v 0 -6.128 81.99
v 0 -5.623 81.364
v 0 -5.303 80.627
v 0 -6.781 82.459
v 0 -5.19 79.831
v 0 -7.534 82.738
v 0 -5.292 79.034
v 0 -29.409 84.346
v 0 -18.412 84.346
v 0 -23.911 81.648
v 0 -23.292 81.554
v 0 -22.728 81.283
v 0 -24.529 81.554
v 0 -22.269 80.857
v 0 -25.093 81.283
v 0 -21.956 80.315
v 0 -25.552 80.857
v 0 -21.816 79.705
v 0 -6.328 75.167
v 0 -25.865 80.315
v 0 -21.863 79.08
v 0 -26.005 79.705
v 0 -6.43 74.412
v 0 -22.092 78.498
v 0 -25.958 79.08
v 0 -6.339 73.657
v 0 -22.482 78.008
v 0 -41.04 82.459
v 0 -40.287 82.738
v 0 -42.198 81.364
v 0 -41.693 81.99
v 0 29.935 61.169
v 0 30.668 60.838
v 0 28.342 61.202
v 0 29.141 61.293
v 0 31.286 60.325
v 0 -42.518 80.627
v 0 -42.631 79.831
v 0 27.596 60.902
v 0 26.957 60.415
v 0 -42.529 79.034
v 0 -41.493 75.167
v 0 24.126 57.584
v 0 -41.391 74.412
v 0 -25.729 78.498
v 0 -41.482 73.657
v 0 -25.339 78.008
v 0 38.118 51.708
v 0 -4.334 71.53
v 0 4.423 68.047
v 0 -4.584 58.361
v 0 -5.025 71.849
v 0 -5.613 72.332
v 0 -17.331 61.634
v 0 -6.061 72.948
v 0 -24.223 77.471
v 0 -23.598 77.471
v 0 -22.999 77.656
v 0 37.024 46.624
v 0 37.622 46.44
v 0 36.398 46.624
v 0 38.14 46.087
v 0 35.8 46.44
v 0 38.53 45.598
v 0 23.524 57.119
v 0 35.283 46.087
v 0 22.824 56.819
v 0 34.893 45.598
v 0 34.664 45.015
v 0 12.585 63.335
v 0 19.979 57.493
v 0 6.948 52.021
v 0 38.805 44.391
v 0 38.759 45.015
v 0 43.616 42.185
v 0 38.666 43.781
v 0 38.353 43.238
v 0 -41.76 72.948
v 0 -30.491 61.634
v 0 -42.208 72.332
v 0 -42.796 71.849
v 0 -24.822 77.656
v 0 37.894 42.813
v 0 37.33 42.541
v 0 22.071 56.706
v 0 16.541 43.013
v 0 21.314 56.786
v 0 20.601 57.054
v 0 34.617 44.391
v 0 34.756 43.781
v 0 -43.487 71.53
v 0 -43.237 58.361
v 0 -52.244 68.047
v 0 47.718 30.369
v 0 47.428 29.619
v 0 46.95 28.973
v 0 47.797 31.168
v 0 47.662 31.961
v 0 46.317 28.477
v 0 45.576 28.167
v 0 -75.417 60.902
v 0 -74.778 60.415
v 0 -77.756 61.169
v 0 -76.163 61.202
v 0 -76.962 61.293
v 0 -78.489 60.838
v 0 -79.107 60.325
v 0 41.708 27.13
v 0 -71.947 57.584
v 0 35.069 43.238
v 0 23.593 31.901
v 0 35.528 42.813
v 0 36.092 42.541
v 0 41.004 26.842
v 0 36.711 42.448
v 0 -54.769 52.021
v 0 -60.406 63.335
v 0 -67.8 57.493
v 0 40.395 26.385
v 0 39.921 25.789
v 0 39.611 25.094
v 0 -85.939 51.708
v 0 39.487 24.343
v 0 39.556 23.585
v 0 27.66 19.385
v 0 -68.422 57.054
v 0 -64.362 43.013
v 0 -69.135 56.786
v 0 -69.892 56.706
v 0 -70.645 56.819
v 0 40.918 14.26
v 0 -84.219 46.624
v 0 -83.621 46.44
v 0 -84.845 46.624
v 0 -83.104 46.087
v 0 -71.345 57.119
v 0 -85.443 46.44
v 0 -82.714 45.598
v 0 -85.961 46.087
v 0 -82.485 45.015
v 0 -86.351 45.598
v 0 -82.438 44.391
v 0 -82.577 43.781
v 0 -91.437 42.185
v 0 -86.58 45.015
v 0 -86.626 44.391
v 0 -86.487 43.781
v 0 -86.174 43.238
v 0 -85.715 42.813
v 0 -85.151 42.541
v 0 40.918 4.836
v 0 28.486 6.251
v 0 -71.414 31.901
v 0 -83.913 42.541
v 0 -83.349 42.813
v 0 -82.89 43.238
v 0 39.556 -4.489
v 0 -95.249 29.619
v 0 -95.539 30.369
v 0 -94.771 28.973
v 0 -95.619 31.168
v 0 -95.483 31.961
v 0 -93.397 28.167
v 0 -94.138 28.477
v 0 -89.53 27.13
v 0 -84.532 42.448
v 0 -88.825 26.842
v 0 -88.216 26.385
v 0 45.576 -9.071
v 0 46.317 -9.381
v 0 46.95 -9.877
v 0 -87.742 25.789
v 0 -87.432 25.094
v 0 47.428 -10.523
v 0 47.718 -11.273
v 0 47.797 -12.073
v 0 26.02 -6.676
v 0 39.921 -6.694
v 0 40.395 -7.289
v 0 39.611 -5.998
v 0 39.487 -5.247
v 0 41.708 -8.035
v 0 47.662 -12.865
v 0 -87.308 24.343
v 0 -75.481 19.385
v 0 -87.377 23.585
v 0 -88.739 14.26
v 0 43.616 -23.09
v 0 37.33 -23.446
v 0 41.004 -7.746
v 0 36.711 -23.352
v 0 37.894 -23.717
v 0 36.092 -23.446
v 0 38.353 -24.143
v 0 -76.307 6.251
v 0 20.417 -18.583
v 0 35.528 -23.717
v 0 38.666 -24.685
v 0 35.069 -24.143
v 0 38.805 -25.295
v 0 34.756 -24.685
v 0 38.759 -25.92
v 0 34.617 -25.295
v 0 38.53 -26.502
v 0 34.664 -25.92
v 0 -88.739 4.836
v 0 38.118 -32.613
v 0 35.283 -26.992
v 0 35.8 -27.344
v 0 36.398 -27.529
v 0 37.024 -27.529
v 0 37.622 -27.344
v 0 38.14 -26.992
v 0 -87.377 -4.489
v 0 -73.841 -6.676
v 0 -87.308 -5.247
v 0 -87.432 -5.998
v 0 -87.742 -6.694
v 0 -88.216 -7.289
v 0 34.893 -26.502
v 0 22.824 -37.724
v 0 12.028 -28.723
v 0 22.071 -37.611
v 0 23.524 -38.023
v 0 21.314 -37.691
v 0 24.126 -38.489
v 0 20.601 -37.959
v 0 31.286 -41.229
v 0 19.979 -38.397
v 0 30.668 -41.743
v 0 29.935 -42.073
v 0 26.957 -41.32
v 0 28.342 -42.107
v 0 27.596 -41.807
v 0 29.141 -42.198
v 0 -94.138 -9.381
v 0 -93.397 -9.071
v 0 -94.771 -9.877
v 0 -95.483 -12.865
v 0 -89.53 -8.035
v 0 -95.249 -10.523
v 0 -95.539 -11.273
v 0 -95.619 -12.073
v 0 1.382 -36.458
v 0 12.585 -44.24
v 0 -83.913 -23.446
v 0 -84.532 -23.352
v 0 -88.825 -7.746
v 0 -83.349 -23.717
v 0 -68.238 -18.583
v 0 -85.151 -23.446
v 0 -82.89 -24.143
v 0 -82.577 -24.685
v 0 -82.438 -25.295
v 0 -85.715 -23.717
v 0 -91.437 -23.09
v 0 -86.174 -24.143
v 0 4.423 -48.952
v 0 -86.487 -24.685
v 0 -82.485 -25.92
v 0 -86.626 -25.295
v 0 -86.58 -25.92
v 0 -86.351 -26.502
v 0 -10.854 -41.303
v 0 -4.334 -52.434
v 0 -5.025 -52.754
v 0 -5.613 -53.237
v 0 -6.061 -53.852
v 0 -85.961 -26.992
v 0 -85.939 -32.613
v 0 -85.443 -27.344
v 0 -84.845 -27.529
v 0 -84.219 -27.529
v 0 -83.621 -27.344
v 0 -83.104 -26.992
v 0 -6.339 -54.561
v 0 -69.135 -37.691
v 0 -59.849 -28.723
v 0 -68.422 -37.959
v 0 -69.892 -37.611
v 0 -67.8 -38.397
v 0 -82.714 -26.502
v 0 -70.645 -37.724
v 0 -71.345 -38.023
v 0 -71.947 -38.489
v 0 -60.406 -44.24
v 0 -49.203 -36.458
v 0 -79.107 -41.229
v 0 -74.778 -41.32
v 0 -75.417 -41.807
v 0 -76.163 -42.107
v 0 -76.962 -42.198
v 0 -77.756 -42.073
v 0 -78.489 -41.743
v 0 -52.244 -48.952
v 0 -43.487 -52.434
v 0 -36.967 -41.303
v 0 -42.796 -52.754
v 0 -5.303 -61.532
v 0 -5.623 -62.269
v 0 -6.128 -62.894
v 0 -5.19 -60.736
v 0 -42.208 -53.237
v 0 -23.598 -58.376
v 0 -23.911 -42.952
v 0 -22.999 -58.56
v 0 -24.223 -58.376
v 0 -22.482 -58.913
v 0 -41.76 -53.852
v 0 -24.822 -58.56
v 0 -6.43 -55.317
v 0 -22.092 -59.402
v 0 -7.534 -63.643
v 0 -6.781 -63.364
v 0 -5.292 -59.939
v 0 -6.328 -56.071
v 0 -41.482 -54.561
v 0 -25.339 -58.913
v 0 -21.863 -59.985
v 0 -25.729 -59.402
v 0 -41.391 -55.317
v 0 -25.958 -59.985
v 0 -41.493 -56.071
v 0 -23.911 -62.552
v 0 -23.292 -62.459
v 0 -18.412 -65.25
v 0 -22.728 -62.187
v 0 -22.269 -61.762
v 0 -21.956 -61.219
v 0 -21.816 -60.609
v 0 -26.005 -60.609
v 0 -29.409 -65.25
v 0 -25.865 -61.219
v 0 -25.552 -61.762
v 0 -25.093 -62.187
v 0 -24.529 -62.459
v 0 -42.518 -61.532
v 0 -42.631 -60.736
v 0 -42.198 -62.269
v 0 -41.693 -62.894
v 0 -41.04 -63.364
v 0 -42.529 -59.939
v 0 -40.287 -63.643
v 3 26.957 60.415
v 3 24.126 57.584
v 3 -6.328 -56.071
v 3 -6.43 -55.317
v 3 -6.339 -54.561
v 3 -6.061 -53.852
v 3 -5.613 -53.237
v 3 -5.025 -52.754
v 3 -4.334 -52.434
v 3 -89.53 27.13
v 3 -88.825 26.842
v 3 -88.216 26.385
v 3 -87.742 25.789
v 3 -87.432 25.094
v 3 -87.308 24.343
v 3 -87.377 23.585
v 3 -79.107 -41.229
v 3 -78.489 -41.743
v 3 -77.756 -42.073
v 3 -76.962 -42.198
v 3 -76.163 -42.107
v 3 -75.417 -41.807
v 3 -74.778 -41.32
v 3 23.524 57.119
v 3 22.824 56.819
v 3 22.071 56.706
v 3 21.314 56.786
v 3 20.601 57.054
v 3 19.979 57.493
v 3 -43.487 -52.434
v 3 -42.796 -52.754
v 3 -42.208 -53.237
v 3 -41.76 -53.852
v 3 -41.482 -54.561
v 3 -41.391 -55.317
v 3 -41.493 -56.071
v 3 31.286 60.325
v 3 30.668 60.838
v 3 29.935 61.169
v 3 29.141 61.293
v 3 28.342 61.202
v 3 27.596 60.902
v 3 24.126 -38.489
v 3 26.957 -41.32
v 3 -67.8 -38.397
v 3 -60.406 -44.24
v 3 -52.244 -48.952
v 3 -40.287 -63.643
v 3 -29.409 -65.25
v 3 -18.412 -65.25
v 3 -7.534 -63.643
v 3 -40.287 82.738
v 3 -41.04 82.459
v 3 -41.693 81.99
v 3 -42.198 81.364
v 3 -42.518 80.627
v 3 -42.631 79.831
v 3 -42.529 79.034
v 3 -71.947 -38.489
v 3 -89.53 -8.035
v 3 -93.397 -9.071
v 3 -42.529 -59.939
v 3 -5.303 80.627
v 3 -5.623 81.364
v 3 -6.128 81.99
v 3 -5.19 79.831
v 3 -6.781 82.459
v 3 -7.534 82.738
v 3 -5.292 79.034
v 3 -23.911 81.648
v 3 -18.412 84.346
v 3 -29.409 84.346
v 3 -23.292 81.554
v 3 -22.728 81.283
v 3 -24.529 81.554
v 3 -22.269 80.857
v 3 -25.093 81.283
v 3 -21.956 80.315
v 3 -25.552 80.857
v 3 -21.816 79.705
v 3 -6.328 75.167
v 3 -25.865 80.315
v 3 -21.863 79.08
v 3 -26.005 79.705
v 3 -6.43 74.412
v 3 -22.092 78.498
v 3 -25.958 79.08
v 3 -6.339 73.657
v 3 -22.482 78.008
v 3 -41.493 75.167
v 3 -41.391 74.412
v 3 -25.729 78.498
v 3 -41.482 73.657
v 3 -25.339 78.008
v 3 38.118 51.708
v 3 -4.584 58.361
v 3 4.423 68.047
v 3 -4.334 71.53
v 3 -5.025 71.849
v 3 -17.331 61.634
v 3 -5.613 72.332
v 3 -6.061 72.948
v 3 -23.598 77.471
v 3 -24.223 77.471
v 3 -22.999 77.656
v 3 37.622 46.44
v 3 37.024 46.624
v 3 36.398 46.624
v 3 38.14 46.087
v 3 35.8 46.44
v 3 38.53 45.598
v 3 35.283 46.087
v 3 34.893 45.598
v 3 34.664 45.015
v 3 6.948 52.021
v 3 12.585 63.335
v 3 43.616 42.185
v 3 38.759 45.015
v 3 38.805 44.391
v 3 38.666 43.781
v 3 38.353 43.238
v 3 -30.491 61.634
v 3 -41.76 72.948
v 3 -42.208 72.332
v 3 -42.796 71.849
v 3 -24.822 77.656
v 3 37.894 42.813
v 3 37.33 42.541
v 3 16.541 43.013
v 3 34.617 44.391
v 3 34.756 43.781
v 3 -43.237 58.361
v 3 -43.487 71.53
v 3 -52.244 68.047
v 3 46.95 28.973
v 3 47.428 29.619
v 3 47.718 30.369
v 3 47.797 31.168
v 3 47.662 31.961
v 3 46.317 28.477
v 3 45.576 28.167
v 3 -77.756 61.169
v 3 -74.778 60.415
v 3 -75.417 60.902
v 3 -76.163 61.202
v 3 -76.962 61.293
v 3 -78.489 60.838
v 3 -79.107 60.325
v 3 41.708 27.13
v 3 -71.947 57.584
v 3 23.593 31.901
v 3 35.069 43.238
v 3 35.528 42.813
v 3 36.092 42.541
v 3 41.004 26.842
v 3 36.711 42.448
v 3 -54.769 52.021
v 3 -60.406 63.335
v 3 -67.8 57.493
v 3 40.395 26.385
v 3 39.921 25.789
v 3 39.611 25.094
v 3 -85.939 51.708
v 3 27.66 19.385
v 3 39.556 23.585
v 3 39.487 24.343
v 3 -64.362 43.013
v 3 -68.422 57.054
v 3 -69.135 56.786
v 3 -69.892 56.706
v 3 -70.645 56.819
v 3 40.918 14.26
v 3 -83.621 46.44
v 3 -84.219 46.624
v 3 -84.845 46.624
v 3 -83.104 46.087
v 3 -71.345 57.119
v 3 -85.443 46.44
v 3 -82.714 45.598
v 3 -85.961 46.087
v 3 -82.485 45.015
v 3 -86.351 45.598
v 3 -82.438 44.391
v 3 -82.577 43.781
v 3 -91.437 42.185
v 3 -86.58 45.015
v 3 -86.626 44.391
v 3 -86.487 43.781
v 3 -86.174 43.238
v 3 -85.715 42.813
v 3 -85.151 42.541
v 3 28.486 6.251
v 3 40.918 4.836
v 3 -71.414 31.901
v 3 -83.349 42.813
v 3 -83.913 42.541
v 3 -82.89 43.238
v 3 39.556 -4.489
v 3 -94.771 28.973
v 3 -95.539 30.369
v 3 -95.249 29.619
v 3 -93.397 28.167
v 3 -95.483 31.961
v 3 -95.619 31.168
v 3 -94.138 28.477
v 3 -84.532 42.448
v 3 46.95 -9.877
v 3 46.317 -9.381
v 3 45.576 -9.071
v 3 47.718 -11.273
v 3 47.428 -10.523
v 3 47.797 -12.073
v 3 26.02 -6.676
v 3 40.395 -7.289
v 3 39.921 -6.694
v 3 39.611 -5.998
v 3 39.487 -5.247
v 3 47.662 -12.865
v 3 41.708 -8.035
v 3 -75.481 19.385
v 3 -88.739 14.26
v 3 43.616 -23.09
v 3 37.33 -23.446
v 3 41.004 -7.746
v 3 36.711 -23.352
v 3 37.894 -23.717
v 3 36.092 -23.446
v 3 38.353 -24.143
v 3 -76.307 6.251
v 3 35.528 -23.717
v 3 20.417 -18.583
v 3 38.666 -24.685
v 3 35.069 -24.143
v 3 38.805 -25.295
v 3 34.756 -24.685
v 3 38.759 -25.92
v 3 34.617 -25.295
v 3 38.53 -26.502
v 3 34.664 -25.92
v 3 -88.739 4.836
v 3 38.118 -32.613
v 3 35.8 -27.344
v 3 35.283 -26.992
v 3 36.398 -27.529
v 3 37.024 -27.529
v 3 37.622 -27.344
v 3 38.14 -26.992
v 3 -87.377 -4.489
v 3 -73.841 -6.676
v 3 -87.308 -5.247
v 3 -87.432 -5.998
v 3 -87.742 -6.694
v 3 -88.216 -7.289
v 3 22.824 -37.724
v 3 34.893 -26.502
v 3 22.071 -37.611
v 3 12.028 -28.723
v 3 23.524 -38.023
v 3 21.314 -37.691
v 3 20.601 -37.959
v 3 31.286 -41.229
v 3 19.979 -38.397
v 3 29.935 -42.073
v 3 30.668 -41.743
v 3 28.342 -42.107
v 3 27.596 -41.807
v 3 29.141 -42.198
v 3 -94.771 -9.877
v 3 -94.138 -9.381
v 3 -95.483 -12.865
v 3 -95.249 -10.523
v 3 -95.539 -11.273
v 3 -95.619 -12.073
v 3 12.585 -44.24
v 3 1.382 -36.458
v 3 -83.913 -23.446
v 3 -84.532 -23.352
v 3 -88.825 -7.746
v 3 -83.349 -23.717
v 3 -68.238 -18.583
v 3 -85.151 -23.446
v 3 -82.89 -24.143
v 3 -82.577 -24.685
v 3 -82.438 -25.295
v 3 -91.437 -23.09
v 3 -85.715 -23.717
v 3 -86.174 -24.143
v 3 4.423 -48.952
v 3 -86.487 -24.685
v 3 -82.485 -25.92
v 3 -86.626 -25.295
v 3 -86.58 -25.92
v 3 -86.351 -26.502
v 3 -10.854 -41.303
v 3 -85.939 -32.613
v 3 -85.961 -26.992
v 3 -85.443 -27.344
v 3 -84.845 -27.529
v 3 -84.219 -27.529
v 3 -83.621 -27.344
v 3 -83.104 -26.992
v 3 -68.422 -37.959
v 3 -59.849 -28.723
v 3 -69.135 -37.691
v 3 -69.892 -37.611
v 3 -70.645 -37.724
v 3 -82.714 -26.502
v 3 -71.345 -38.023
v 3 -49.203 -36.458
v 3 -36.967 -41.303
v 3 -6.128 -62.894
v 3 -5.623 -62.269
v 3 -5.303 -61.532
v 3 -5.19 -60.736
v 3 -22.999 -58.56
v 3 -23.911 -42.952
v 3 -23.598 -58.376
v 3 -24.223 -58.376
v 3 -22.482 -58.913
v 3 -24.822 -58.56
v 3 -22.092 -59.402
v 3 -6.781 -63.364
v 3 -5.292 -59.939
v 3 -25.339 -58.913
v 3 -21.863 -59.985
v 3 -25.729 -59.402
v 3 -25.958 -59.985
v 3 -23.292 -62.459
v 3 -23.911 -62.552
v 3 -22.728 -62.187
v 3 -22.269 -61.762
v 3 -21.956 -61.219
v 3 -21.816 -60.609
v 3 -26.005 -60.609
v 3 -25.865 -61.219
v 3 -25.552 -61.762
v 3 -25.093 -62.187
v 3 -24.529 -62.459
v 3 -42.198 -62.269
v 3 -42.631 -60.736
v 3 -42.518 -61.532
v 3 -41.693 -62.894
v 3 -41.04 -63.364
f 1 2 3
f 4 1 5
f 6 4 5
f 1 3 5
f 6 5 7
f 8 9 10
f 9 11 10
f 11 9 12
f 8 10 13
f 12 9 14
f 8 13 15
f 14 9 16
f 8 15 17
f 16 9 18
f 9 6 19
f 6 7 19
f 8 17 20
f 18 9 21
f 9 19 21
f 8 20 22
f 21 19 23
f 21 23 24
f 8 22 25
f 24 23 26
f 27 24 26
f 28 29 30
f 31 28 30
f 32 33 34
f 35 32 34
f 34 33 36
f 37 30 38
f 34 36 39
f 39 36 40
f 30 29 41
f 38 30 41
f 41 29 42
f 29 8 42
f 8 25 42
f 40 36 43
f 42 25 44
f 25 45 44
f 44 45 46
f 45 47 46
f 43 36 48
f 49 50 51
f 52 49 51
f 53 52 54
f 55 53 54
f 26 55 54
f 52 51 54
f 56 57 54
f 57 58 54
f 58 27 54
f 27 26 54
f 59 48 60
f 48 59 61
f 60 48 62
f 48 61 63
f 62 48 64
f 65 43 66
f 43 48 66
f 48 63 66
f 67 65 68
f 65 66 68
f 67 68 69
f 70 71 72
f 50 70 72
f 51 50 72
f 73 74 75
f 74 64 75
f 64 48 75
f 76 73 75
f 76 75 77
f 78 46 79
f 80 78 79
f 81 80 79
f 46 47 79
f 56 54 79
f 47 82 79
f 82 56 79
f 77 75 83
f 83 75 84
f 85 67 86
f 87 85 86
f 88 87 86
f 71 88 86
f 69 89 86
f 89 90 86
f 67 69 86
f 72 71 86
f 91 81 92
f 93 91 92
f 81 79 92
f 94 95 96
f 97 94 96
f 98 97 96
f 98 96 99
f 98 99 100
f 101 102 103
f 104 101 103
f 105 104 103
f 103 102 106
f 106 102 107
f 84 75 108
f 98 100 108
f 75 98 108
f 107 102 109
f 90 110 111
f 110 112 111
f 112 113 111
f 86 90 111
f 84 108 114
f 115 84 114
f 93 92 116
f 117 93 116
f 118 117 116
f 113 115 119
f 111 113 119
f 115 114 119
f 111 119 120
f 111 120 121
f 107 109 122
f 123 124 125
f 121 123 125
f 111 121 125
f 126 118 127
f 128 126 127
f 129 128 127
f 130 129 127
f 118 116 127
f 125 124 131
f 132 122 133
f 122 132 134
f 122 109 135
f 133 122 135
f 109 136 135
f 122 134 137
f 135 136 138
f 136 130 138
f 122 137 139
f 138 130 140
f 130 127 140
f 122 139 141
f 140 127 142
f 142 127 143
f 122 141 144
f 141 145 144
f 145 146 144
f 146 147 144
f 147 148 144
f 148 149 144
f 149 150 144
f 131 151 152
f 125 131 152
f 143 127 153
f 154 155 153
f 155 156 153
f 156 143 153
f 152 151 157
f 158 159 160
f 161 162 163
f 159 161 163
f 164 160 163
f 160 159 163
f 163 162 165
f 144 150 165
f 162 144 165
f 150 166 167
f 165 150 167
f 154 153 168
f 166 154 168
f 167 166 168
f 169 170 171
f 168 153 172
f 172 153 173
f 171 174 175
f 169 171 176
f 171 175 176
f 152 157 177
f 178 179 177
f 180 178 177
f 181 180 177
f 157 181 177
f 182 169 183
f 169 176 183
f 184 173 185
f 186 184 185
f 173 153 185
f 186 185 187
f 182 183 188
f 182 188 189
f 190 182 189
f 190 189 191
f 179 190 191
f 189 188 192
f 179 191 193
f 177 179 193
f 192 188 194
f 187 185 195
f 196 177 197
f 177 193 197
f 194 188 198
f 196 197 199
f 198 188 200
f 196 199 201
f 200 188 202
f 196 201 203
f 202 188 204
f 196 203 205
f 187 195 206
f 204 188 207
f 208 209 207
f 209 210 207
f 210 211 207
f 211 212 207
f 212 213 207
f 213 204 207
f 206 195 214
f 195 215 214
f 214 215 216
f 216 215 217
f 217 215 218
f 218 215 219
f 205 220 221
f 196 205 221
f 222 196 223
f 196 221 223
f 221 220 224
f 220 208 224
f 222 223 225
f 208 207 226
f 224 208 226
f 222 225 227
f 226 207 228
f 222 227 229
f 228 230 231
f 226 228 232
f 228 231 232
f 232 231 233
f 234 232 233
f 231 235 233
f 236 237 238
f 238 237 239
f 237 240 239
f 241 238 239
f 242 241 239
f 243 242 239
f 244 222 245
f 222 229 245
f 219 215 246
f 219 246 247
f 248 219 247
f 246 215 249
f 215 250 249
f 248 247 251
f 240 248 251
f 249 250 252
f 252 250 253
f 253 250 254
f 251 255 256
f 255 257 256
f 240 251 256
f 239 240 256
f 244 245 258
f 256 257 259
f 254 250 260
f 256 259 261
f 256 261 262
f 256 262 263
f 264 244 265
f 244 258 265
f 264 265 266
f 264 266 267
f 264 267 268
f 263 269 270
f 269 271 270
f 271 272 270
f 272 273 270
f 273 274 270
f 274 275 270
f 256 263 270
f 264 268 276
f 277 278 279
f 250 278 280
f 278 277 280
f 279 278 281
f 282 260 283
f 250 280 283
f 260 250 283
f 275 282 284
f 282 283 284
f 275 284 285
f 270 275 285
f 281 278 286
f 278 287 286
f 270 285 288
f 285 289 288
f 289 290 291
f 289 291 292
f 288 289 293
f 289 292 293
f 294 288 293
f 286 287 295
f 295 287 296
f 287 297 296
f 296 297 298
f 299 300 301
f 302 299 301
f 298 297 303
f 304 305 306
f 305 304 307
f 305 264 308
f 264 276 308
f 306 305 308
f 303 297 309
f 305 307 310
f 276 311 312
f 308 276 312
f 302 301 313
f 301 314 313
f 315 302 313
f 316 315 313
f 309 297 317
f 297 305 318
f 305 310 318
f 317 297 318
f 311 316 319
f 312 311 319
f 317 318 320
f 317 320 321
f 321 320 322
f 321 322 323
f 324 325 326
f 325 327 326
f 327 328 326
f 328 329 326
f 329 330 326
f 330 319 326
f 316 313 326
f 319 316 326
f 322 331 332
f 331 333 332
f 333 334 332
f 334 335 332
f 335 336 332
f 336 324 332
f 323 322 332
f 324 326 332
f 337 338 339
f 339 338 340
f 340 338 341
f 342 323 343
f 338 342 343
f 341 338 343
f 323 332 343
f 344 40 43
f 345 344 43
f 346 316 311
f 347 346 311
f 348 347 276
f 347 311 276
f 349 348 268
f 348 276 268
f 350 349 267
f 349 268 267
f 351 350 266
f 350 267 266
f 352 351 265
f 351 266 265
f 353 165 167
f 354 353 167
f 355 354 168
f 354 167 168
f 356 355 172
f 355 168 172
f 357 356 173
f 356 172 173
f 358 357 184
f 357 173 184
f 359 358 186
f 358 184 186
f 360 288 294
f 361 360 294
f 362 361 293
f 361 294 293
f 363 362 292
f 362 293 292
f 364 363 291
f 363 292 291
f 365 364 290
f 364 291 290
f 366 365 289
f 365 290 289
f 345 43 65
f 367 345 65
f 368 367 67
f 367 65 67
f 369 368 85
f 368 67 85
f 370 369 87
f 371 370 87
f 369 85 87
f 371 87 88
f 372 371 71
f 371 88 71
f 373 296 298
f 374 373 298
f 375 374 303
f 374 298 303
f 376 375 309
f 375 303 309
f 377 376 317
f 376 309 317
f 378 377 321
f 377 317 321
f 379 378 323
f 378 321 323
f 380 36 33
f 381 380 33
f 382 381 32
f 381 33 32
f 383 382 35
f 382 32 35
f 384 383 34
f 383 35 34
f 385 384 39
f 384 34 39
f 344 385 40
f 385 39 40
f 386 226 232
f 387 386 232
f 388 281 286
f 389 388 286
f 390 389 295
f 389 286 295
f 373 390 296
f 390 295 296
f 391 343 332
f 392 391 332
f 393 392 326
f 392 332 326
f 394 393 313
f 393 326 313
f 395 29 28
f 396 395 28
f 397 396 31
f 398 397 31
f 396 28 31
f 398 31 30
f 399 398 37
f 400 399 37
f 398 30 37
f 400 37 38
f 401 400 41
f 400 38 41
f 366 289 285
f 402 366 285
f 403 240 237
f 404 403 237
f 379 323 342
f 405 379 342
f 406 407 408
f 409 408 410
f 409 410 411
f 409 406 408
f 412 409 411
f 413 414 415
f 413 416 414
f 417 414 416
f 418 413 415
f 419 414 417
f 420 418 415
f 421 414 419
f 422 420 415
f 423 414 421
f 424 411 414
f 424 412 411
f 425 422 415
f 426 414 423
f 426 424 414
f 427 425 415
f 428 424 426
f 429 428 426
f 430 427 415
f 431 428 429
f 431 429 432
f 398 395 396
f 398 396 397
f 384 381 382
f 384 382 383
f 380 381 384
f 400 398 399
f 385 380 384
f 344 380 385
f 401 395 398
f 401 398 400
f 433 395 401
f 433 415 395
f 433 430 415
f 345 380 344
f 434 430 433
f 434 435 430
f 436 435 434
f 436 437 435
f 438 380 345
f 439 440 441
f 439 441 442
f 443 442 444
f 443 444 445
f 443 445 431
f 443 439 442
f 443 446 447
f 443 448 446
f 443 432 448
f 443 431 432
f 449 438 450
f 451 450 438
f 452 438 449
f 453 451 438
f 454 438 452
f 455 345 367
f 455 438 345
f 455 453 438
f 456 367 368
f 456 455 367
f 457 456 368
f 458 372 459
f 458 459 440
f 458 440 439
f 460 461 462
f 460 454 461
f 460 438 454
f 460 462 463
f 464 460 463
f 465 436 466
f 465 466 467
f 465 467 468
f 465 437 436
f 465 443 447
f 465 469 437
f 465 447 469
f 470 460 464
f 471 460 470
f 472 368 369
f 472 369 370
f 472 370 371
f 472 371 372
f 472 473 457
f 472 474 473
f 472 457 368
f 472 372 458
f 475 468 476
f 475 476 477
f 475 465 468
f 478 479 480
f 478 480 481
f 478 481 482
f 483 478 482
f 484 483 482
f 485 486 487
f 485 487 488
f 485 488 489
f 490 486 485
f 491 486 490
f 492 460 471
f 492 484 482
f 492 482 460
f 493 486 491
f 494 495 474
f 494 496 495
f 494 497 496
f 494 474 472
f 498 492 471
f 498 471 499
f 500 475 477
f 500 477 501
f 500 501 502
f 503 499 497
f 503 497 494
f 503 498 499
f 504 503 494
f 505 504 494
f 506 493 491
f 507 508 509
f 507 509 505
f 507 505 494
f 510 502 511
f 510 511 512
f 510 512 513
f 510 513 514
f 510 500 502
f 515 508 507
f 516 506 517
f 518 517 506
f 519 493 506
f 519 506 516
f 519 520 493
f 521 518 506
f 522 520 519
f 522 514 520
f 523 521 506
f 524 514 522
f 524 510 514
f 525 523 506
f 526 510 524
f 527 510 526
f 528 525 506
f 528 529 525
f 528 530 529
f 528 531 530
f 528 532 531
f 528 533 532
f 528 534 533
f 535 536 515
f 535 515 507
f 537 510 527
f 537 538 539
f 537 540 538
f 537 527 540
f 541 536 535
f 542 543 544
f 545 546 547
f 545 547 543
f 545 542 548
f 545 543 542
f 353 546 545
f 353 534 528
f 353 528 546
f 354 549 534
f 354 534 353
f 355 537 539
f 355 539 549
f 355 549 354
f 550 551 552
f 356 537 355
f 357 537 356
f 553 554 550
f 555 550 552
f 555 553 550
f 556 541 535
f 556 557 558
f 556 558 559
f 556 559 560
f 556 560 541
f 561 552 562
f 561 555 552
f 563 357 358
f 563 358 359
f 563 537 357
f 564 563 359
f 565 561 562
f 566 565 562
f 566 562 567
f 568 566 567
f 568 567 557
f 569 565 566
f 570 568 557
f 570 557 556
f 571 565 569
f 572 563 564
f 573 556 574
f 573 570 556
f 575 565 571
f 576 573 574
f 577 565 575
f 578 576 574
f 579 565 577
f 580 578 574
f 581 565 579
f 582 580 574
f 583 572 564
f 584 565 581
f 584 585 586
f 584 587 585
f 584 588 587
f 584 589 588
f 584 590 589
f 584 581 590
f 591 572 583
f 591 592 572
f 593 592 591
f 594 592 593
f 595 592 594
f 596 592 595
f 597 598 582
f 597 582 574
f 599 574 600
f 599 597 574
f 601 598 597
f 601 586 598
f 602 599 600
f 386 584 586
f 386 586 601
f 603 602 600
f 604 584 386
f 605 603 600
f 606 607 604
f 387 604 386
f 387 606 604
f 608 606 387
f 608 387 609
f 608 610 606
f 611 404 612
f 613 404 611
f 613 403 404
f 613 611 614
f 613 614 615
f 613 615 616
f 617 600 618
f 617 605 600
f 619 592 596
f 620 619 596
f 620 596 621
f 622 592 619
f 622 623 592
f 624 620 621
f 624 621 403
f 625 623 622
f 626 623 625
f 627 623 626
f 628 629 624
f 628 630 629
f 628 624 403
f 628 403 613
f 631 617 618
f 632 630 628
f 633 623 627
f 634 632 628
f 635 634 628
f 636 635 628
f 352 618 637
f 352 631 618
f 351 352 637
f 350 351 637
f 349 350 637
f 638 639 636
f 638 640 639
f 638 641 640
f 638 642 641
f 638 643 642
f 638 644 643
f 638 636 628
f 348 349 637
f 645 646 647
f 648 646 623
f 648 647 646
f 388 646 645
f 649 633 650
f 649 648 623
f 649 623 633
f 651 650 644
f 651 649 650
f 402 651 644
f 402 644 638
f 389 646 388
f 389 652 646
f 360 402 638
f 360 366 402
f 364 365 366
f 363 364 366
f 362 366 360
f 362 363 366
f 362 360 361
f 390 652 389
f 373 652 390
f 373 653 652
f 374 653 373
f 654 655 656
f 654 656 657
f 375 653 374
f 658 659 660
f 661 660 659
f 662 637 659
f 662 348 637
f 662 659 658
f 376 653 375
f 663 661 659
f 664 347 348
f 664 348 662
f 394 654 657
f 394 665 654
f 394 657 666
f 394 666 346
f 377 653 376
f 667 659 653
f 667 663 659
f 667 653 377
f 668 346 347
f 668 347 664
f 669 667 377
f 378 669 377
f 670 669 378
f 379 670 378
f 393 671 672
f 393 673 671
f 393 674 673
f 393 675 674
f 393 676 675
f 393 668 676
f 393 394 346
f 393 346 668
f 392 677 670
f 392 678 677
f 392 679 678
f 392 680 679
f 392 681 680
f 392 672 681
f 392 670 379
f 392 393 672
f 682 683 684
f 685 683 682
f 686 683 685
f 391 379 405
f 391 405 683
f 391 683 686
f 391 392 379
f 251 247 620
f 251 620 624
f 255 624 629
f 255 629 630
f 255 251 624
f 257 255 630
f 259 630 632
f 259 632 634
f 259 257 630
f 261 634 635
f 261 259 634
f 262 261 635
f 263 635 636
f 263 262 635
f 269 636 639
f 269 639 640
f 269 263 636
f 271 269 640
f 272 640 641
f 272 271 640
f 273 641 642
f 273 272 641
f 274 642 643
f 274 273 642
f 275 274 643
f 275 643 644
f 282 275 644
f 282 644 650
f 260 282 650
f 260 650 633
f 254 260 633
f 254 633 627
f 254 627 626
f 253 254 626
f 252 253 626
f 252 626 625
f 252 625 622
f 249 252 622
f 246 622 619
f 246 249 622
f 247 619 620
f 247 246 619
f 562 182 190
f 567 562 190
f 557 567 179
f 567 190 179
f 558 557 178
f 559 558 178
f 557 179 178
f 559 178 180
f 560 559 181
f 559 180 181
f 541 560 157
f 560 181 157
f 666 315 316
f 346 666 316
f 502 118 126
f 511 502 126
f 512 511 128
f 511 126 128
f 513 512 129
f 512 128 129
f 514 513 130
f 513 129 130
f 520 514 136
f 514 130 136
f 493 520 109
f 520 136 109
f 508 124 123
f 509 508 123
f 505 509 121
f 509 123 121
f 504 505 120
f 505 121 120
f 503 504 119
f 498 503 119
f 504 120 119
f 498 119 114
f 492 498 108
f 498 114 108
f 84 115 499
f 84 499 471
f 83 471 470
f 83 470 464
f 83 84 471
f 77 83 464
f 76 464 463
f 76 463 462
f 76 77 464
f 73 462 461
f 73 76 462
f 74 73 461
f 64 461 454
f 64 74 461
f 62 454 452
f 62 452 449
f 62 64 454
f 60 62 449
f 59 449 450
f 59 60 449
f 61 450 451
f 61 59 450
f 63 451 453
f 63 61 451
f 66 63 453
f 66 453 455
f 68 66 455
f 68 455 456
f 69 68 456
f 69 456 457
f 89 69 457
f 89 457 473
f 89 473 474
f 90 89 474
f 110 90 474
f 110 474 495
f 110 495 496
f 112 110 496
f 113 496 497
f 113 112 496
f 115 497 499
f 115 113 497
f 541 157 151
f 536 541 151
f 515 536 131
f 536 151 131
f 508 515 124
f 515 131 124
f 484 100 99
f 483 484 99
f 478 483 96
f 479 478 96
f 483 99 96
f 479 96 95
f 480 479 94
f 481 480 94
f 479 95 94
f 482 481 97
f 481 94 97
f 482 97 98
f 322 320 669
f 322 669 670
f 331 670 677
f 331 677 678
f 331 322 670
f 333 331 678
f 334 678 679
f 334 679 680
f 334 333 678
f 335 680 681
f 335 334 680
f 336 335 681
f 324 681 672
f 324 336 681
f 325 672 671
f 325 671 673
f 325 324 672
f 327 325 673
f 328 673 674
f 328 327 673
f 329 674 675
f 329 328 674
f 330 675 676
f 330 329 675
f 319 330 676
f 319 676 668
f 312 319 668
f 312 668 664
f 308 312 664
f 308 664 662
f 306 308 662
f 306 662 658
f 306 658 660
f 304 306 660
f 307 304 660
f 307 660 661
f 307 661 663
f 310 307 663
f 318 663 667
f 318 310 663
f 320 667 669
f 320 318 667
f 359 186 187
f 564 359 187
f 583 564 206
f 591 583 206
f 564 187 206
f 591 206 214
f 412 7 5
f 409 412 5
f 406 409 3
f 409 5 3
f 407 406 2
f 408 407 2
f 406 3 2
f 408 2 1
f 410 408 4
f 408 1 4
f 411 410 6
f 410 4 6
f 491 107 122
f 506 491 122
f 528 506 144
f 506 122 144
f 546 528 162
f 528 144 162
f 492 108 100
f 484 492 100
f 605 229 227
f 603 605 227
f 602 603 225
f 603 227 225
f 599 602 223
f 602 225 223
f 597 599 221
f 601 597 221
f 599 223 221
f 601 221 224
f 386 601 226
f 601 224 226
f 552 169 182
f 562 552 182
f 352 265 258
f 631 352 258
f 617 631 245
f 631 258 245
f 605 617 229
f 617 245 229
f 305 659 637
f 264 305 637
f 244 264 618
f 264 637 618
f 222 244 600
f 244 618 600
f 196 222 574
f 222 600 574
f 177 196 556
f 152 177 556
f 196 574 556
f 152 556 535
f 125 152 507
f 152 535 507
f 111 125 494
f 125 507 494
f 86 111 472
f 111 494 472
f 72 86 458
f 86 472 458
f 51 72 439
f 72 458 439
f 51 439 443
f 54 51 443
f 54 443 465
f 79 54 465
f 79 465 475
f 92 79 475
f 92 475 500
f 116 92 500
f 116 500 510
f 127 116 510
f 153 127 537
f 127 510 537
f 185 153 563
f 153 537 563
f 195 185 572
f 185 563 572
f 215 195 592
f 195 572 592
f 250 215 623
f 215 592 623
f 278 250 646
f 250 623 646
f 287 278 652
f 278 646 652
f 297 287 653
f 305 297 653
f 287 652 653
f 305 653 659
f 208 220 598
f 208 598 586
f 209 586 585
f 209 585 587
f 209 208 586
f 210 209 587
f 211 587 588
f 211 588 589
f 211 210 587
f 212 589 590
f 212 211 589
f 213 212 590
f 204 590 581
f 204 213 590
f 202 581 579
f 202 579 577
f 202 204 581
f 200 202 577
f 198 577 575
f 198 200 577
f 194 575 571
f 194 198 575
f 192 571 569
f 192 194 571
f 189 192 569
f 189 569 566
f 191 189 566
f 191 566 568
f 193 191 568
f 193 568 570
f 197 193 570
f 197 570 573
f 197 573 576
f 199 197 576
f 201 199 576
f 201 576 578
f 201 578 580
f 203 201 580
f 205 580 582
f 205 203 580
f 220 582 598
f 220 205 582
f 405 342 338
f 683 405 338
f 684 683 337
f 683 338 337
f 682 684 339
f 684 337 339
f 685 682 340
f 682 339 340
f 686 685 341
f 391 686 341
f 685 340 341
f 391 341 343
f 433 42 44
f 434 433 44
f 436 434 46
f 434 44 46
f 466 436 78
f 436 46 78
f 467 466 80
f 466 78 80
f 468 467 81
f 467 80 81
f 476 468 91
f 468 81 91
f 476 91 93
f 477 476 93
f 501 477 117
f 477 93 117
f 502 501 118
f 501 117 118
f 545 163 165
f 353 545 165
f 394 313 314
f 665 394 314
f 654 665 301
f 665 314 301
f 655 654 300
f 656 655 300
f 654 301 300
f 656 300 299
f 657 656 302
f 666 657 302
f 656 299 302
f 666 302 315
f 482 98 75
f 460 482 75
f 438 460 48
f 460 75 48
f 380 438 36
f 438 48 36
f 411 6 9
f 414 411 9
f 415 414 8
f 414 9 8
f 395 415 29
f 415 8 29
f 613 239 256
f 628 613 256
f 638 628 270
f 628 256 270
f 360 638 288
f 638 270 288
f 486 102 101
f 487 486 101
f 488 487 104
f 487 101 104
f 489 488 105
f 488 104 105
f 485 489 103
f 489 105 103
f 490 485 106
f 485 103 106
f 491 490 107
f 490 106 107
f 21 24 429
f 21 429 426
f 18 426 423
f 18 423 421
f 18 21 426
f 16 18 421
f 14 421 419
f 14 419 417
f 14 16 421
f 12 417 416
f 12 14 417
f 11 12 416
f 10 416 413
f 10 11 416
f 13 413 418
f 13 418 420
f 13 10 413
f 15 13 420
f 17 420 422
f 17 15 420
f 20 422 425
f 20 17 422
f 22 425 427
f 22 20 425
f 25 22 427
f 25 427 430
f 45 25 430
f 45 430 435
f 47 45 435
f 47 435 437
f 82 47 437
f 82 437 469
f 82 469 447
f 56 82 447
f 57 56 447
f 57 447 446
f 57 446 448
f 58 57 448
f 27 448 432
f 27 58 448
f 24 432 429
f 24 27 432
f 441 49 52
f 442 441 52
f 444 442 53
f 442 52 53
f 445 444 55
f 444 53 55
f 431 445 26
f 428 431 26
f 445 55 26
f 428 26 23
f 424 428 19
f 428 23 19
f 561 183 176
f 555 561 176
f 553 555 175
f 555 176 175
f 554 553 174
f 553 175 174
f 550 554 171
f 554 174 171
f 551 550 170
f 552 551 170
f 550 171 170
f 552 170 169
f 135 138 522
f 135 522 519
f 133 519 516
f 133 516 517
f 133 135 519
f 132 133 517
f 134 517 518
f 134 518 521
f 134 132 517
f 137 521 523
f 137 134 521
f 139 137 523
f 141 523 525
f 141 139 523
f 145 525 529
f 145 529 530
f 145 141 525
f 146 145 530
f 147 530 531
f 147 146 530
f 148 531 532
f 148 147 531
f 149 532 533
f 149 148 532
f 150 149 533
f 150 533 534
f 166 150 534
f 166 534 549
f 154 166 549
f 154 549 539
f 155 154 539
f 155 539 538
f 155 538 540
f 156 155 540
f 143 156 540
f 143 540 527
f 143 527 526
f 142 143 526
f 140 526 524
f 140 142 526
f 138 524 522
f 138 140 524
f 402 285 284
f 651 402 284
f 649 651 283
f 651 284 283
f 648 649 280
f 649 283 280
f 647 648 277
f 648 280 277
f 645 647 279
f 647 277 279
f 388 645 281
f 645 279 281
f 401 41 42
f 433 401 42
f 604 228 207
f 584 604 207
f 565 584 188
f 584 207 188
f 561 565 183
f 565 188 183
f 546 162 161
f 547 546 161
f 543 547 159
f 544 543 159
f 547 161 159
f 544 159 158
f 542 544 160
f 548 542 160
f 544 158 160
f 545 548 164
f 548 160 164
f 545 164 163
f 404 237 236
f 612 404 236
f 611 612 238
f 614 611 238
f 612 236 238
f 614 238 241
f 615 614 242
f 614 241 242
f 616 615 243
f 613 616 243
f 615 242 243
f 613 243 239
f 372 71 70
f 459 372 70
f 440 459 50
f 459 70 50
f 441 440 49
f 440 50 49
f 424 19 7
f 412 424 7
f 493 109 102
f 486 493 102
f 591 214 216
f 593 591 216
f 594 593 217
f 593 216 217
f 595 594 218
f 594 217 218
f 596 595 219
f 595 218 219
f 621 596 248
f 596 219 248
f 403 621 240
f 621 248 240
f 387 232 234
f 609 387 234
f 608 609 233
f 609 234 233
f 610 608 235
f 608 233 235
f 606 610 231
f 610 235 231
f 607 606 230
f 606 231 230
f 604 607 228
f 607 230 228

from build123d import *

# Parameters (mm, degrees)
SKETCH_2_R               = 2.807146676
EXTRUDE_2_DEPTH          = 3
SKETCH_3_R               = 52.5
CUT_EXTRUDE_1_DEPTH      = 3
EXTRUDE_START            = -3
SKETCH_4_R               = 2.807146676
SKETCH_4_R_2             = 2.1
EXTRUDE_3_DEPTH          = 3
PATTERN_CIRCULAR_1_COUNT = 6


with BuildPart() as part:
    # 草图2 → 凸台-拉伸2 (new body)
    with BuildSketch(Plane(origin=(0, 0, 0), x_dir=(0, 0, -1), z_dir=(1, 0, 0))):
        with BuildLine():
            Line((-60.415227383, 26.95696902), (-57.584197007, 24.125938644))
            ThreePointArc((-57.584197007, 24.125938644), (-56.706247683, 22.070810886), (-57.492674784, 19.978951059))
            ThreePointArc((-57.492674784, 19.978951059), (-65.839403755, 8.589494146), (-71.529598291, -4.333713637))
            ThreePointArc((-71.529598291, -4.333713637), (-72.947988492, -6.060709399), (-75.166756001, -6.32794686))
            Line((-75.166756001, -6.32794686), (-79.034015413, -5.291717824))
            ThreePointArc((-79.034015413, -5.291717824), (-81.364285194, -5.623240003), (-82.738085883, -7.534453196))
            ThreePointArc((-82.738085883, -7.534453196), (-84.547752509, -23.910505854), (-82.738085883, -40.286558511))
            ThreePointArc((-82.738085883, -40.286558511), (-81.364285194, -42.197771704), (-79.034015413, -42.529293884))
            Line((-79.034015413, -42.529293884), (-75.166756001, -41.493064847))
            ThreePointArc((-75.166756001, -41.493064847), (-72.947988492, -41.760302308), (-71.529598291, -43.48729807))
            ThreePointArc((-71.529598291, -43.48729807), (-65.839403755, -56.410505854), (-57.492674784, -67.799962766))
            ThreePointArc((-57.492674784, -67.799962766), (-56.706247683, -69.891822593), (-57.584197007, -71.946950351))
            Line((-57.584197007, -71.946950351), (-60.415227383, -74.777980727))
            ThreePointArc((-60.415227383, -74.777980727), (-61.293255644, -76.961814644), (-60.324996811, -79.107167538))
            ThreePointArc((-60.324996811, -79.107167538), (-47.047752509, -88.862411137), (-31.960841581, -95.483220195))
            ThreePointArc((-31.960841581, -95.483220195), (-29.618782059, -95.249080495), (-28.16654054, -93.396768757))
            Line((-28.16654054, -93.396768757), (-27.130311503, -89.529509345))
            ThreePointArc((-27.130311503, -89.529509345), (-25.789493318, -87.741619048), (-23.584676016, -87.376754982))
            ThreePointArc((-23.584676016, -87.376754982), (-9.547752509, -88.910505854), (4.489170997, -87.376754982))
            ThreePointArc((4.489170997, -87.376754982), (6.693988299, -87.741619048), (8.034806484, -89.529509345))
            Line((8.034806484, -89.529509345), (9.071035521, -93.396768757))
            ThreePointArc((9.071035521, -93.396768757), (10.52327704, -95.249080495), (12.865336562, -95.483220195))
            ThreePointArc((12.865336562, -95.483220195), (27.952247491, -88.862411137), (41.229491792, -79.107167538))
            ThreePointArc((41.229491792, -79.107167538), (42.197750625, -76.961814644), (41.319722364, -74.777980727))
            Line((41.319722364, -74.777980727), (38.488691988, -71.946950351))
            ThreePointArc((38.488691988, -71.946950351), (37.610742664, -69.891822593), (38.397169765, -67.799962766))
            ThreePointArc((38.397169765, -67.799962766), (46.743898737, -56.410505854), (52.434093272, -43.48729807))
            ThreePointArc((52.434093272, -43.48729807), (53.852483473, -41.760302308), (56.071250982, -41.493064847))
            Line((56.071250982, -41.493064847), (59.938510394, -42.529293884))
            ThreePointArc((59.938510394, -42.529293884), (62.268780175, -42.197771704), (63.642580864, -40.286558511))
            ThreePointArc((63.642580864, -40.286558511), (65.452247491, -23.910505854), (63.642580864, -7.534453196))
            ThreePointArc((63.642580864, -7.534453196), (62.268780175, -5.623240003), (59.938510394, -5.291717824))
            Line((59.938510394, -5.291717824), (56.071250982, -6.32794686))
            ThreePointArc((56.071250982, -6.32794686), (53.852483473, -6.060709399), (52.434093272, -4.333713637))
            ThreePointArc((52.434093272, -4.333713637), (46.743898737, 8.589494146), (38.397169765, 19.978951059))
            ThreePointArc((38.397169765, 19.978951059), (37.610742664, 22.070810886), (38.488691988, 24.125938644))
            Line((38.488691988, 24.125938644), (41.319722364, 26.95696902))
            ThreePointArc((41.319722364, 26.95696902), (42.197750625, 29.140802937), (41.229491792, 31.286155831))
            ThreePointArc((41.229491792, 31.286155831), (27.952247491, 41.04139943), (12.865336562, 47.662208488))
            ThreePointArc((12.865336562, 47.662208488), (10.52327704, 47.428068788), (9.071035521, 45.57575705))
            Line((9.071035521, 45.57575705), (8.034806484, 41.708497638))
            ThreePointArc((8.034806484, 41.708497638), (6.693988299, 39.92060734), (4.489170997, 39.555743275))
            ThreePointArc((4.489170997, 39.555743275), (-9.547752509, 41.089494146), (-23.584676016, 39.555743275))
            ThreePointArc((-23.584676016, 39.555743275), (-25.789493318, 39.92060734), (-27.130311503, 41.708497638))
            Line((-27.130311503, 41.708497638), (-28.16654054, 45.57575705))
            ThreePointArc((-28.16654054, 45.57575705), (-29.618782059, 47.428068788), (-31.960841581, 47.662208488))
            ThreePointArc((-31.960841581, 47.662208488), (-47.047752509, 41.04139943), (-60.324996811, 31.286155831))
            ThreePointArc((-60.324996811, 31.286155831), (-61.293255644, 29.140802937), (-60.415227383, 26.95696902))
        make_face()
        with Locations((-44.547752509, 36.711272411)):
            Circle(SKETCH_2_R, mode=Mode.SUBTRACT)
        with Locations((-79.547752509, -23.910505854)):
            Circle(SKETCH_2_R, mode=Mode.SUBTRACT)
        with Locations((-44.547752509, -84.532284119)):
            Circle(SKETCH_2_R, mode=Mode.SUBTRACT)
        with Locations((25.452247491, -84.532284119)):
            Circle(SKETCH_2_R, mode=Mode.SUBTRACT)
        with Locations((60.452247491, -23.910505854)):
            Circle(SKETCH_2_R, mode=Mode.SUBTRACT)
        with Locations((25.452247491, 36.711272411)):
            Circle(SKETCH_2_R, mode=Mode.SUBTRACT)
    extrude(amount=EXTRUDE_2_DEPTH)

    # 草图3 → 切除-拉伸1 (cut)
    with BuildSketch(Plane(origin=(3, 0, 0), x_dir=(0, 0, -1), z_dir=(1, 0, 0))):
        with Locations((-9.547752509, -23.910505854)):
            Circle(SKETCH_3_R)
    extrude(amount=-CUT_EXTRUDE_1_DEPTH, mode=Mode.SUBTRACT)

    # 草图4 → 凸台-拉伸3 (add)
    with BuildSketch(Plane(origin=(3, 0, 0), x_dir=(0, 0, -1), z_dir=(1, 0, 0)).offset(EXTRUDE_START)):
        with Locations((-44.547752509, 36.711272411)):
            Circle(SKETCH_4_R)
        with Locations((-44.547752509, 36.711272411)):
            Circle(SKETCH_4_R_2, mode=Mode.SUBTRACT)
    extrude_3 = extrude(amount=EXTRUDE_3_DEPTH)

    # 阵列(圆周)1: 凸台-拉伸3 ×6 about axis
    pattern_circular_1_axis = Axis((0, -23.910505854, 9.547752509), (1, 0, 0))
    for i in range(1, PATTERN_CIRCULAR_1_COUNT):
        add(extrude_3.rotate(pattern_circular_1_axis, i * 360 / PATTERN_CIRCULAR_1_COUNT))


solid = part.part
